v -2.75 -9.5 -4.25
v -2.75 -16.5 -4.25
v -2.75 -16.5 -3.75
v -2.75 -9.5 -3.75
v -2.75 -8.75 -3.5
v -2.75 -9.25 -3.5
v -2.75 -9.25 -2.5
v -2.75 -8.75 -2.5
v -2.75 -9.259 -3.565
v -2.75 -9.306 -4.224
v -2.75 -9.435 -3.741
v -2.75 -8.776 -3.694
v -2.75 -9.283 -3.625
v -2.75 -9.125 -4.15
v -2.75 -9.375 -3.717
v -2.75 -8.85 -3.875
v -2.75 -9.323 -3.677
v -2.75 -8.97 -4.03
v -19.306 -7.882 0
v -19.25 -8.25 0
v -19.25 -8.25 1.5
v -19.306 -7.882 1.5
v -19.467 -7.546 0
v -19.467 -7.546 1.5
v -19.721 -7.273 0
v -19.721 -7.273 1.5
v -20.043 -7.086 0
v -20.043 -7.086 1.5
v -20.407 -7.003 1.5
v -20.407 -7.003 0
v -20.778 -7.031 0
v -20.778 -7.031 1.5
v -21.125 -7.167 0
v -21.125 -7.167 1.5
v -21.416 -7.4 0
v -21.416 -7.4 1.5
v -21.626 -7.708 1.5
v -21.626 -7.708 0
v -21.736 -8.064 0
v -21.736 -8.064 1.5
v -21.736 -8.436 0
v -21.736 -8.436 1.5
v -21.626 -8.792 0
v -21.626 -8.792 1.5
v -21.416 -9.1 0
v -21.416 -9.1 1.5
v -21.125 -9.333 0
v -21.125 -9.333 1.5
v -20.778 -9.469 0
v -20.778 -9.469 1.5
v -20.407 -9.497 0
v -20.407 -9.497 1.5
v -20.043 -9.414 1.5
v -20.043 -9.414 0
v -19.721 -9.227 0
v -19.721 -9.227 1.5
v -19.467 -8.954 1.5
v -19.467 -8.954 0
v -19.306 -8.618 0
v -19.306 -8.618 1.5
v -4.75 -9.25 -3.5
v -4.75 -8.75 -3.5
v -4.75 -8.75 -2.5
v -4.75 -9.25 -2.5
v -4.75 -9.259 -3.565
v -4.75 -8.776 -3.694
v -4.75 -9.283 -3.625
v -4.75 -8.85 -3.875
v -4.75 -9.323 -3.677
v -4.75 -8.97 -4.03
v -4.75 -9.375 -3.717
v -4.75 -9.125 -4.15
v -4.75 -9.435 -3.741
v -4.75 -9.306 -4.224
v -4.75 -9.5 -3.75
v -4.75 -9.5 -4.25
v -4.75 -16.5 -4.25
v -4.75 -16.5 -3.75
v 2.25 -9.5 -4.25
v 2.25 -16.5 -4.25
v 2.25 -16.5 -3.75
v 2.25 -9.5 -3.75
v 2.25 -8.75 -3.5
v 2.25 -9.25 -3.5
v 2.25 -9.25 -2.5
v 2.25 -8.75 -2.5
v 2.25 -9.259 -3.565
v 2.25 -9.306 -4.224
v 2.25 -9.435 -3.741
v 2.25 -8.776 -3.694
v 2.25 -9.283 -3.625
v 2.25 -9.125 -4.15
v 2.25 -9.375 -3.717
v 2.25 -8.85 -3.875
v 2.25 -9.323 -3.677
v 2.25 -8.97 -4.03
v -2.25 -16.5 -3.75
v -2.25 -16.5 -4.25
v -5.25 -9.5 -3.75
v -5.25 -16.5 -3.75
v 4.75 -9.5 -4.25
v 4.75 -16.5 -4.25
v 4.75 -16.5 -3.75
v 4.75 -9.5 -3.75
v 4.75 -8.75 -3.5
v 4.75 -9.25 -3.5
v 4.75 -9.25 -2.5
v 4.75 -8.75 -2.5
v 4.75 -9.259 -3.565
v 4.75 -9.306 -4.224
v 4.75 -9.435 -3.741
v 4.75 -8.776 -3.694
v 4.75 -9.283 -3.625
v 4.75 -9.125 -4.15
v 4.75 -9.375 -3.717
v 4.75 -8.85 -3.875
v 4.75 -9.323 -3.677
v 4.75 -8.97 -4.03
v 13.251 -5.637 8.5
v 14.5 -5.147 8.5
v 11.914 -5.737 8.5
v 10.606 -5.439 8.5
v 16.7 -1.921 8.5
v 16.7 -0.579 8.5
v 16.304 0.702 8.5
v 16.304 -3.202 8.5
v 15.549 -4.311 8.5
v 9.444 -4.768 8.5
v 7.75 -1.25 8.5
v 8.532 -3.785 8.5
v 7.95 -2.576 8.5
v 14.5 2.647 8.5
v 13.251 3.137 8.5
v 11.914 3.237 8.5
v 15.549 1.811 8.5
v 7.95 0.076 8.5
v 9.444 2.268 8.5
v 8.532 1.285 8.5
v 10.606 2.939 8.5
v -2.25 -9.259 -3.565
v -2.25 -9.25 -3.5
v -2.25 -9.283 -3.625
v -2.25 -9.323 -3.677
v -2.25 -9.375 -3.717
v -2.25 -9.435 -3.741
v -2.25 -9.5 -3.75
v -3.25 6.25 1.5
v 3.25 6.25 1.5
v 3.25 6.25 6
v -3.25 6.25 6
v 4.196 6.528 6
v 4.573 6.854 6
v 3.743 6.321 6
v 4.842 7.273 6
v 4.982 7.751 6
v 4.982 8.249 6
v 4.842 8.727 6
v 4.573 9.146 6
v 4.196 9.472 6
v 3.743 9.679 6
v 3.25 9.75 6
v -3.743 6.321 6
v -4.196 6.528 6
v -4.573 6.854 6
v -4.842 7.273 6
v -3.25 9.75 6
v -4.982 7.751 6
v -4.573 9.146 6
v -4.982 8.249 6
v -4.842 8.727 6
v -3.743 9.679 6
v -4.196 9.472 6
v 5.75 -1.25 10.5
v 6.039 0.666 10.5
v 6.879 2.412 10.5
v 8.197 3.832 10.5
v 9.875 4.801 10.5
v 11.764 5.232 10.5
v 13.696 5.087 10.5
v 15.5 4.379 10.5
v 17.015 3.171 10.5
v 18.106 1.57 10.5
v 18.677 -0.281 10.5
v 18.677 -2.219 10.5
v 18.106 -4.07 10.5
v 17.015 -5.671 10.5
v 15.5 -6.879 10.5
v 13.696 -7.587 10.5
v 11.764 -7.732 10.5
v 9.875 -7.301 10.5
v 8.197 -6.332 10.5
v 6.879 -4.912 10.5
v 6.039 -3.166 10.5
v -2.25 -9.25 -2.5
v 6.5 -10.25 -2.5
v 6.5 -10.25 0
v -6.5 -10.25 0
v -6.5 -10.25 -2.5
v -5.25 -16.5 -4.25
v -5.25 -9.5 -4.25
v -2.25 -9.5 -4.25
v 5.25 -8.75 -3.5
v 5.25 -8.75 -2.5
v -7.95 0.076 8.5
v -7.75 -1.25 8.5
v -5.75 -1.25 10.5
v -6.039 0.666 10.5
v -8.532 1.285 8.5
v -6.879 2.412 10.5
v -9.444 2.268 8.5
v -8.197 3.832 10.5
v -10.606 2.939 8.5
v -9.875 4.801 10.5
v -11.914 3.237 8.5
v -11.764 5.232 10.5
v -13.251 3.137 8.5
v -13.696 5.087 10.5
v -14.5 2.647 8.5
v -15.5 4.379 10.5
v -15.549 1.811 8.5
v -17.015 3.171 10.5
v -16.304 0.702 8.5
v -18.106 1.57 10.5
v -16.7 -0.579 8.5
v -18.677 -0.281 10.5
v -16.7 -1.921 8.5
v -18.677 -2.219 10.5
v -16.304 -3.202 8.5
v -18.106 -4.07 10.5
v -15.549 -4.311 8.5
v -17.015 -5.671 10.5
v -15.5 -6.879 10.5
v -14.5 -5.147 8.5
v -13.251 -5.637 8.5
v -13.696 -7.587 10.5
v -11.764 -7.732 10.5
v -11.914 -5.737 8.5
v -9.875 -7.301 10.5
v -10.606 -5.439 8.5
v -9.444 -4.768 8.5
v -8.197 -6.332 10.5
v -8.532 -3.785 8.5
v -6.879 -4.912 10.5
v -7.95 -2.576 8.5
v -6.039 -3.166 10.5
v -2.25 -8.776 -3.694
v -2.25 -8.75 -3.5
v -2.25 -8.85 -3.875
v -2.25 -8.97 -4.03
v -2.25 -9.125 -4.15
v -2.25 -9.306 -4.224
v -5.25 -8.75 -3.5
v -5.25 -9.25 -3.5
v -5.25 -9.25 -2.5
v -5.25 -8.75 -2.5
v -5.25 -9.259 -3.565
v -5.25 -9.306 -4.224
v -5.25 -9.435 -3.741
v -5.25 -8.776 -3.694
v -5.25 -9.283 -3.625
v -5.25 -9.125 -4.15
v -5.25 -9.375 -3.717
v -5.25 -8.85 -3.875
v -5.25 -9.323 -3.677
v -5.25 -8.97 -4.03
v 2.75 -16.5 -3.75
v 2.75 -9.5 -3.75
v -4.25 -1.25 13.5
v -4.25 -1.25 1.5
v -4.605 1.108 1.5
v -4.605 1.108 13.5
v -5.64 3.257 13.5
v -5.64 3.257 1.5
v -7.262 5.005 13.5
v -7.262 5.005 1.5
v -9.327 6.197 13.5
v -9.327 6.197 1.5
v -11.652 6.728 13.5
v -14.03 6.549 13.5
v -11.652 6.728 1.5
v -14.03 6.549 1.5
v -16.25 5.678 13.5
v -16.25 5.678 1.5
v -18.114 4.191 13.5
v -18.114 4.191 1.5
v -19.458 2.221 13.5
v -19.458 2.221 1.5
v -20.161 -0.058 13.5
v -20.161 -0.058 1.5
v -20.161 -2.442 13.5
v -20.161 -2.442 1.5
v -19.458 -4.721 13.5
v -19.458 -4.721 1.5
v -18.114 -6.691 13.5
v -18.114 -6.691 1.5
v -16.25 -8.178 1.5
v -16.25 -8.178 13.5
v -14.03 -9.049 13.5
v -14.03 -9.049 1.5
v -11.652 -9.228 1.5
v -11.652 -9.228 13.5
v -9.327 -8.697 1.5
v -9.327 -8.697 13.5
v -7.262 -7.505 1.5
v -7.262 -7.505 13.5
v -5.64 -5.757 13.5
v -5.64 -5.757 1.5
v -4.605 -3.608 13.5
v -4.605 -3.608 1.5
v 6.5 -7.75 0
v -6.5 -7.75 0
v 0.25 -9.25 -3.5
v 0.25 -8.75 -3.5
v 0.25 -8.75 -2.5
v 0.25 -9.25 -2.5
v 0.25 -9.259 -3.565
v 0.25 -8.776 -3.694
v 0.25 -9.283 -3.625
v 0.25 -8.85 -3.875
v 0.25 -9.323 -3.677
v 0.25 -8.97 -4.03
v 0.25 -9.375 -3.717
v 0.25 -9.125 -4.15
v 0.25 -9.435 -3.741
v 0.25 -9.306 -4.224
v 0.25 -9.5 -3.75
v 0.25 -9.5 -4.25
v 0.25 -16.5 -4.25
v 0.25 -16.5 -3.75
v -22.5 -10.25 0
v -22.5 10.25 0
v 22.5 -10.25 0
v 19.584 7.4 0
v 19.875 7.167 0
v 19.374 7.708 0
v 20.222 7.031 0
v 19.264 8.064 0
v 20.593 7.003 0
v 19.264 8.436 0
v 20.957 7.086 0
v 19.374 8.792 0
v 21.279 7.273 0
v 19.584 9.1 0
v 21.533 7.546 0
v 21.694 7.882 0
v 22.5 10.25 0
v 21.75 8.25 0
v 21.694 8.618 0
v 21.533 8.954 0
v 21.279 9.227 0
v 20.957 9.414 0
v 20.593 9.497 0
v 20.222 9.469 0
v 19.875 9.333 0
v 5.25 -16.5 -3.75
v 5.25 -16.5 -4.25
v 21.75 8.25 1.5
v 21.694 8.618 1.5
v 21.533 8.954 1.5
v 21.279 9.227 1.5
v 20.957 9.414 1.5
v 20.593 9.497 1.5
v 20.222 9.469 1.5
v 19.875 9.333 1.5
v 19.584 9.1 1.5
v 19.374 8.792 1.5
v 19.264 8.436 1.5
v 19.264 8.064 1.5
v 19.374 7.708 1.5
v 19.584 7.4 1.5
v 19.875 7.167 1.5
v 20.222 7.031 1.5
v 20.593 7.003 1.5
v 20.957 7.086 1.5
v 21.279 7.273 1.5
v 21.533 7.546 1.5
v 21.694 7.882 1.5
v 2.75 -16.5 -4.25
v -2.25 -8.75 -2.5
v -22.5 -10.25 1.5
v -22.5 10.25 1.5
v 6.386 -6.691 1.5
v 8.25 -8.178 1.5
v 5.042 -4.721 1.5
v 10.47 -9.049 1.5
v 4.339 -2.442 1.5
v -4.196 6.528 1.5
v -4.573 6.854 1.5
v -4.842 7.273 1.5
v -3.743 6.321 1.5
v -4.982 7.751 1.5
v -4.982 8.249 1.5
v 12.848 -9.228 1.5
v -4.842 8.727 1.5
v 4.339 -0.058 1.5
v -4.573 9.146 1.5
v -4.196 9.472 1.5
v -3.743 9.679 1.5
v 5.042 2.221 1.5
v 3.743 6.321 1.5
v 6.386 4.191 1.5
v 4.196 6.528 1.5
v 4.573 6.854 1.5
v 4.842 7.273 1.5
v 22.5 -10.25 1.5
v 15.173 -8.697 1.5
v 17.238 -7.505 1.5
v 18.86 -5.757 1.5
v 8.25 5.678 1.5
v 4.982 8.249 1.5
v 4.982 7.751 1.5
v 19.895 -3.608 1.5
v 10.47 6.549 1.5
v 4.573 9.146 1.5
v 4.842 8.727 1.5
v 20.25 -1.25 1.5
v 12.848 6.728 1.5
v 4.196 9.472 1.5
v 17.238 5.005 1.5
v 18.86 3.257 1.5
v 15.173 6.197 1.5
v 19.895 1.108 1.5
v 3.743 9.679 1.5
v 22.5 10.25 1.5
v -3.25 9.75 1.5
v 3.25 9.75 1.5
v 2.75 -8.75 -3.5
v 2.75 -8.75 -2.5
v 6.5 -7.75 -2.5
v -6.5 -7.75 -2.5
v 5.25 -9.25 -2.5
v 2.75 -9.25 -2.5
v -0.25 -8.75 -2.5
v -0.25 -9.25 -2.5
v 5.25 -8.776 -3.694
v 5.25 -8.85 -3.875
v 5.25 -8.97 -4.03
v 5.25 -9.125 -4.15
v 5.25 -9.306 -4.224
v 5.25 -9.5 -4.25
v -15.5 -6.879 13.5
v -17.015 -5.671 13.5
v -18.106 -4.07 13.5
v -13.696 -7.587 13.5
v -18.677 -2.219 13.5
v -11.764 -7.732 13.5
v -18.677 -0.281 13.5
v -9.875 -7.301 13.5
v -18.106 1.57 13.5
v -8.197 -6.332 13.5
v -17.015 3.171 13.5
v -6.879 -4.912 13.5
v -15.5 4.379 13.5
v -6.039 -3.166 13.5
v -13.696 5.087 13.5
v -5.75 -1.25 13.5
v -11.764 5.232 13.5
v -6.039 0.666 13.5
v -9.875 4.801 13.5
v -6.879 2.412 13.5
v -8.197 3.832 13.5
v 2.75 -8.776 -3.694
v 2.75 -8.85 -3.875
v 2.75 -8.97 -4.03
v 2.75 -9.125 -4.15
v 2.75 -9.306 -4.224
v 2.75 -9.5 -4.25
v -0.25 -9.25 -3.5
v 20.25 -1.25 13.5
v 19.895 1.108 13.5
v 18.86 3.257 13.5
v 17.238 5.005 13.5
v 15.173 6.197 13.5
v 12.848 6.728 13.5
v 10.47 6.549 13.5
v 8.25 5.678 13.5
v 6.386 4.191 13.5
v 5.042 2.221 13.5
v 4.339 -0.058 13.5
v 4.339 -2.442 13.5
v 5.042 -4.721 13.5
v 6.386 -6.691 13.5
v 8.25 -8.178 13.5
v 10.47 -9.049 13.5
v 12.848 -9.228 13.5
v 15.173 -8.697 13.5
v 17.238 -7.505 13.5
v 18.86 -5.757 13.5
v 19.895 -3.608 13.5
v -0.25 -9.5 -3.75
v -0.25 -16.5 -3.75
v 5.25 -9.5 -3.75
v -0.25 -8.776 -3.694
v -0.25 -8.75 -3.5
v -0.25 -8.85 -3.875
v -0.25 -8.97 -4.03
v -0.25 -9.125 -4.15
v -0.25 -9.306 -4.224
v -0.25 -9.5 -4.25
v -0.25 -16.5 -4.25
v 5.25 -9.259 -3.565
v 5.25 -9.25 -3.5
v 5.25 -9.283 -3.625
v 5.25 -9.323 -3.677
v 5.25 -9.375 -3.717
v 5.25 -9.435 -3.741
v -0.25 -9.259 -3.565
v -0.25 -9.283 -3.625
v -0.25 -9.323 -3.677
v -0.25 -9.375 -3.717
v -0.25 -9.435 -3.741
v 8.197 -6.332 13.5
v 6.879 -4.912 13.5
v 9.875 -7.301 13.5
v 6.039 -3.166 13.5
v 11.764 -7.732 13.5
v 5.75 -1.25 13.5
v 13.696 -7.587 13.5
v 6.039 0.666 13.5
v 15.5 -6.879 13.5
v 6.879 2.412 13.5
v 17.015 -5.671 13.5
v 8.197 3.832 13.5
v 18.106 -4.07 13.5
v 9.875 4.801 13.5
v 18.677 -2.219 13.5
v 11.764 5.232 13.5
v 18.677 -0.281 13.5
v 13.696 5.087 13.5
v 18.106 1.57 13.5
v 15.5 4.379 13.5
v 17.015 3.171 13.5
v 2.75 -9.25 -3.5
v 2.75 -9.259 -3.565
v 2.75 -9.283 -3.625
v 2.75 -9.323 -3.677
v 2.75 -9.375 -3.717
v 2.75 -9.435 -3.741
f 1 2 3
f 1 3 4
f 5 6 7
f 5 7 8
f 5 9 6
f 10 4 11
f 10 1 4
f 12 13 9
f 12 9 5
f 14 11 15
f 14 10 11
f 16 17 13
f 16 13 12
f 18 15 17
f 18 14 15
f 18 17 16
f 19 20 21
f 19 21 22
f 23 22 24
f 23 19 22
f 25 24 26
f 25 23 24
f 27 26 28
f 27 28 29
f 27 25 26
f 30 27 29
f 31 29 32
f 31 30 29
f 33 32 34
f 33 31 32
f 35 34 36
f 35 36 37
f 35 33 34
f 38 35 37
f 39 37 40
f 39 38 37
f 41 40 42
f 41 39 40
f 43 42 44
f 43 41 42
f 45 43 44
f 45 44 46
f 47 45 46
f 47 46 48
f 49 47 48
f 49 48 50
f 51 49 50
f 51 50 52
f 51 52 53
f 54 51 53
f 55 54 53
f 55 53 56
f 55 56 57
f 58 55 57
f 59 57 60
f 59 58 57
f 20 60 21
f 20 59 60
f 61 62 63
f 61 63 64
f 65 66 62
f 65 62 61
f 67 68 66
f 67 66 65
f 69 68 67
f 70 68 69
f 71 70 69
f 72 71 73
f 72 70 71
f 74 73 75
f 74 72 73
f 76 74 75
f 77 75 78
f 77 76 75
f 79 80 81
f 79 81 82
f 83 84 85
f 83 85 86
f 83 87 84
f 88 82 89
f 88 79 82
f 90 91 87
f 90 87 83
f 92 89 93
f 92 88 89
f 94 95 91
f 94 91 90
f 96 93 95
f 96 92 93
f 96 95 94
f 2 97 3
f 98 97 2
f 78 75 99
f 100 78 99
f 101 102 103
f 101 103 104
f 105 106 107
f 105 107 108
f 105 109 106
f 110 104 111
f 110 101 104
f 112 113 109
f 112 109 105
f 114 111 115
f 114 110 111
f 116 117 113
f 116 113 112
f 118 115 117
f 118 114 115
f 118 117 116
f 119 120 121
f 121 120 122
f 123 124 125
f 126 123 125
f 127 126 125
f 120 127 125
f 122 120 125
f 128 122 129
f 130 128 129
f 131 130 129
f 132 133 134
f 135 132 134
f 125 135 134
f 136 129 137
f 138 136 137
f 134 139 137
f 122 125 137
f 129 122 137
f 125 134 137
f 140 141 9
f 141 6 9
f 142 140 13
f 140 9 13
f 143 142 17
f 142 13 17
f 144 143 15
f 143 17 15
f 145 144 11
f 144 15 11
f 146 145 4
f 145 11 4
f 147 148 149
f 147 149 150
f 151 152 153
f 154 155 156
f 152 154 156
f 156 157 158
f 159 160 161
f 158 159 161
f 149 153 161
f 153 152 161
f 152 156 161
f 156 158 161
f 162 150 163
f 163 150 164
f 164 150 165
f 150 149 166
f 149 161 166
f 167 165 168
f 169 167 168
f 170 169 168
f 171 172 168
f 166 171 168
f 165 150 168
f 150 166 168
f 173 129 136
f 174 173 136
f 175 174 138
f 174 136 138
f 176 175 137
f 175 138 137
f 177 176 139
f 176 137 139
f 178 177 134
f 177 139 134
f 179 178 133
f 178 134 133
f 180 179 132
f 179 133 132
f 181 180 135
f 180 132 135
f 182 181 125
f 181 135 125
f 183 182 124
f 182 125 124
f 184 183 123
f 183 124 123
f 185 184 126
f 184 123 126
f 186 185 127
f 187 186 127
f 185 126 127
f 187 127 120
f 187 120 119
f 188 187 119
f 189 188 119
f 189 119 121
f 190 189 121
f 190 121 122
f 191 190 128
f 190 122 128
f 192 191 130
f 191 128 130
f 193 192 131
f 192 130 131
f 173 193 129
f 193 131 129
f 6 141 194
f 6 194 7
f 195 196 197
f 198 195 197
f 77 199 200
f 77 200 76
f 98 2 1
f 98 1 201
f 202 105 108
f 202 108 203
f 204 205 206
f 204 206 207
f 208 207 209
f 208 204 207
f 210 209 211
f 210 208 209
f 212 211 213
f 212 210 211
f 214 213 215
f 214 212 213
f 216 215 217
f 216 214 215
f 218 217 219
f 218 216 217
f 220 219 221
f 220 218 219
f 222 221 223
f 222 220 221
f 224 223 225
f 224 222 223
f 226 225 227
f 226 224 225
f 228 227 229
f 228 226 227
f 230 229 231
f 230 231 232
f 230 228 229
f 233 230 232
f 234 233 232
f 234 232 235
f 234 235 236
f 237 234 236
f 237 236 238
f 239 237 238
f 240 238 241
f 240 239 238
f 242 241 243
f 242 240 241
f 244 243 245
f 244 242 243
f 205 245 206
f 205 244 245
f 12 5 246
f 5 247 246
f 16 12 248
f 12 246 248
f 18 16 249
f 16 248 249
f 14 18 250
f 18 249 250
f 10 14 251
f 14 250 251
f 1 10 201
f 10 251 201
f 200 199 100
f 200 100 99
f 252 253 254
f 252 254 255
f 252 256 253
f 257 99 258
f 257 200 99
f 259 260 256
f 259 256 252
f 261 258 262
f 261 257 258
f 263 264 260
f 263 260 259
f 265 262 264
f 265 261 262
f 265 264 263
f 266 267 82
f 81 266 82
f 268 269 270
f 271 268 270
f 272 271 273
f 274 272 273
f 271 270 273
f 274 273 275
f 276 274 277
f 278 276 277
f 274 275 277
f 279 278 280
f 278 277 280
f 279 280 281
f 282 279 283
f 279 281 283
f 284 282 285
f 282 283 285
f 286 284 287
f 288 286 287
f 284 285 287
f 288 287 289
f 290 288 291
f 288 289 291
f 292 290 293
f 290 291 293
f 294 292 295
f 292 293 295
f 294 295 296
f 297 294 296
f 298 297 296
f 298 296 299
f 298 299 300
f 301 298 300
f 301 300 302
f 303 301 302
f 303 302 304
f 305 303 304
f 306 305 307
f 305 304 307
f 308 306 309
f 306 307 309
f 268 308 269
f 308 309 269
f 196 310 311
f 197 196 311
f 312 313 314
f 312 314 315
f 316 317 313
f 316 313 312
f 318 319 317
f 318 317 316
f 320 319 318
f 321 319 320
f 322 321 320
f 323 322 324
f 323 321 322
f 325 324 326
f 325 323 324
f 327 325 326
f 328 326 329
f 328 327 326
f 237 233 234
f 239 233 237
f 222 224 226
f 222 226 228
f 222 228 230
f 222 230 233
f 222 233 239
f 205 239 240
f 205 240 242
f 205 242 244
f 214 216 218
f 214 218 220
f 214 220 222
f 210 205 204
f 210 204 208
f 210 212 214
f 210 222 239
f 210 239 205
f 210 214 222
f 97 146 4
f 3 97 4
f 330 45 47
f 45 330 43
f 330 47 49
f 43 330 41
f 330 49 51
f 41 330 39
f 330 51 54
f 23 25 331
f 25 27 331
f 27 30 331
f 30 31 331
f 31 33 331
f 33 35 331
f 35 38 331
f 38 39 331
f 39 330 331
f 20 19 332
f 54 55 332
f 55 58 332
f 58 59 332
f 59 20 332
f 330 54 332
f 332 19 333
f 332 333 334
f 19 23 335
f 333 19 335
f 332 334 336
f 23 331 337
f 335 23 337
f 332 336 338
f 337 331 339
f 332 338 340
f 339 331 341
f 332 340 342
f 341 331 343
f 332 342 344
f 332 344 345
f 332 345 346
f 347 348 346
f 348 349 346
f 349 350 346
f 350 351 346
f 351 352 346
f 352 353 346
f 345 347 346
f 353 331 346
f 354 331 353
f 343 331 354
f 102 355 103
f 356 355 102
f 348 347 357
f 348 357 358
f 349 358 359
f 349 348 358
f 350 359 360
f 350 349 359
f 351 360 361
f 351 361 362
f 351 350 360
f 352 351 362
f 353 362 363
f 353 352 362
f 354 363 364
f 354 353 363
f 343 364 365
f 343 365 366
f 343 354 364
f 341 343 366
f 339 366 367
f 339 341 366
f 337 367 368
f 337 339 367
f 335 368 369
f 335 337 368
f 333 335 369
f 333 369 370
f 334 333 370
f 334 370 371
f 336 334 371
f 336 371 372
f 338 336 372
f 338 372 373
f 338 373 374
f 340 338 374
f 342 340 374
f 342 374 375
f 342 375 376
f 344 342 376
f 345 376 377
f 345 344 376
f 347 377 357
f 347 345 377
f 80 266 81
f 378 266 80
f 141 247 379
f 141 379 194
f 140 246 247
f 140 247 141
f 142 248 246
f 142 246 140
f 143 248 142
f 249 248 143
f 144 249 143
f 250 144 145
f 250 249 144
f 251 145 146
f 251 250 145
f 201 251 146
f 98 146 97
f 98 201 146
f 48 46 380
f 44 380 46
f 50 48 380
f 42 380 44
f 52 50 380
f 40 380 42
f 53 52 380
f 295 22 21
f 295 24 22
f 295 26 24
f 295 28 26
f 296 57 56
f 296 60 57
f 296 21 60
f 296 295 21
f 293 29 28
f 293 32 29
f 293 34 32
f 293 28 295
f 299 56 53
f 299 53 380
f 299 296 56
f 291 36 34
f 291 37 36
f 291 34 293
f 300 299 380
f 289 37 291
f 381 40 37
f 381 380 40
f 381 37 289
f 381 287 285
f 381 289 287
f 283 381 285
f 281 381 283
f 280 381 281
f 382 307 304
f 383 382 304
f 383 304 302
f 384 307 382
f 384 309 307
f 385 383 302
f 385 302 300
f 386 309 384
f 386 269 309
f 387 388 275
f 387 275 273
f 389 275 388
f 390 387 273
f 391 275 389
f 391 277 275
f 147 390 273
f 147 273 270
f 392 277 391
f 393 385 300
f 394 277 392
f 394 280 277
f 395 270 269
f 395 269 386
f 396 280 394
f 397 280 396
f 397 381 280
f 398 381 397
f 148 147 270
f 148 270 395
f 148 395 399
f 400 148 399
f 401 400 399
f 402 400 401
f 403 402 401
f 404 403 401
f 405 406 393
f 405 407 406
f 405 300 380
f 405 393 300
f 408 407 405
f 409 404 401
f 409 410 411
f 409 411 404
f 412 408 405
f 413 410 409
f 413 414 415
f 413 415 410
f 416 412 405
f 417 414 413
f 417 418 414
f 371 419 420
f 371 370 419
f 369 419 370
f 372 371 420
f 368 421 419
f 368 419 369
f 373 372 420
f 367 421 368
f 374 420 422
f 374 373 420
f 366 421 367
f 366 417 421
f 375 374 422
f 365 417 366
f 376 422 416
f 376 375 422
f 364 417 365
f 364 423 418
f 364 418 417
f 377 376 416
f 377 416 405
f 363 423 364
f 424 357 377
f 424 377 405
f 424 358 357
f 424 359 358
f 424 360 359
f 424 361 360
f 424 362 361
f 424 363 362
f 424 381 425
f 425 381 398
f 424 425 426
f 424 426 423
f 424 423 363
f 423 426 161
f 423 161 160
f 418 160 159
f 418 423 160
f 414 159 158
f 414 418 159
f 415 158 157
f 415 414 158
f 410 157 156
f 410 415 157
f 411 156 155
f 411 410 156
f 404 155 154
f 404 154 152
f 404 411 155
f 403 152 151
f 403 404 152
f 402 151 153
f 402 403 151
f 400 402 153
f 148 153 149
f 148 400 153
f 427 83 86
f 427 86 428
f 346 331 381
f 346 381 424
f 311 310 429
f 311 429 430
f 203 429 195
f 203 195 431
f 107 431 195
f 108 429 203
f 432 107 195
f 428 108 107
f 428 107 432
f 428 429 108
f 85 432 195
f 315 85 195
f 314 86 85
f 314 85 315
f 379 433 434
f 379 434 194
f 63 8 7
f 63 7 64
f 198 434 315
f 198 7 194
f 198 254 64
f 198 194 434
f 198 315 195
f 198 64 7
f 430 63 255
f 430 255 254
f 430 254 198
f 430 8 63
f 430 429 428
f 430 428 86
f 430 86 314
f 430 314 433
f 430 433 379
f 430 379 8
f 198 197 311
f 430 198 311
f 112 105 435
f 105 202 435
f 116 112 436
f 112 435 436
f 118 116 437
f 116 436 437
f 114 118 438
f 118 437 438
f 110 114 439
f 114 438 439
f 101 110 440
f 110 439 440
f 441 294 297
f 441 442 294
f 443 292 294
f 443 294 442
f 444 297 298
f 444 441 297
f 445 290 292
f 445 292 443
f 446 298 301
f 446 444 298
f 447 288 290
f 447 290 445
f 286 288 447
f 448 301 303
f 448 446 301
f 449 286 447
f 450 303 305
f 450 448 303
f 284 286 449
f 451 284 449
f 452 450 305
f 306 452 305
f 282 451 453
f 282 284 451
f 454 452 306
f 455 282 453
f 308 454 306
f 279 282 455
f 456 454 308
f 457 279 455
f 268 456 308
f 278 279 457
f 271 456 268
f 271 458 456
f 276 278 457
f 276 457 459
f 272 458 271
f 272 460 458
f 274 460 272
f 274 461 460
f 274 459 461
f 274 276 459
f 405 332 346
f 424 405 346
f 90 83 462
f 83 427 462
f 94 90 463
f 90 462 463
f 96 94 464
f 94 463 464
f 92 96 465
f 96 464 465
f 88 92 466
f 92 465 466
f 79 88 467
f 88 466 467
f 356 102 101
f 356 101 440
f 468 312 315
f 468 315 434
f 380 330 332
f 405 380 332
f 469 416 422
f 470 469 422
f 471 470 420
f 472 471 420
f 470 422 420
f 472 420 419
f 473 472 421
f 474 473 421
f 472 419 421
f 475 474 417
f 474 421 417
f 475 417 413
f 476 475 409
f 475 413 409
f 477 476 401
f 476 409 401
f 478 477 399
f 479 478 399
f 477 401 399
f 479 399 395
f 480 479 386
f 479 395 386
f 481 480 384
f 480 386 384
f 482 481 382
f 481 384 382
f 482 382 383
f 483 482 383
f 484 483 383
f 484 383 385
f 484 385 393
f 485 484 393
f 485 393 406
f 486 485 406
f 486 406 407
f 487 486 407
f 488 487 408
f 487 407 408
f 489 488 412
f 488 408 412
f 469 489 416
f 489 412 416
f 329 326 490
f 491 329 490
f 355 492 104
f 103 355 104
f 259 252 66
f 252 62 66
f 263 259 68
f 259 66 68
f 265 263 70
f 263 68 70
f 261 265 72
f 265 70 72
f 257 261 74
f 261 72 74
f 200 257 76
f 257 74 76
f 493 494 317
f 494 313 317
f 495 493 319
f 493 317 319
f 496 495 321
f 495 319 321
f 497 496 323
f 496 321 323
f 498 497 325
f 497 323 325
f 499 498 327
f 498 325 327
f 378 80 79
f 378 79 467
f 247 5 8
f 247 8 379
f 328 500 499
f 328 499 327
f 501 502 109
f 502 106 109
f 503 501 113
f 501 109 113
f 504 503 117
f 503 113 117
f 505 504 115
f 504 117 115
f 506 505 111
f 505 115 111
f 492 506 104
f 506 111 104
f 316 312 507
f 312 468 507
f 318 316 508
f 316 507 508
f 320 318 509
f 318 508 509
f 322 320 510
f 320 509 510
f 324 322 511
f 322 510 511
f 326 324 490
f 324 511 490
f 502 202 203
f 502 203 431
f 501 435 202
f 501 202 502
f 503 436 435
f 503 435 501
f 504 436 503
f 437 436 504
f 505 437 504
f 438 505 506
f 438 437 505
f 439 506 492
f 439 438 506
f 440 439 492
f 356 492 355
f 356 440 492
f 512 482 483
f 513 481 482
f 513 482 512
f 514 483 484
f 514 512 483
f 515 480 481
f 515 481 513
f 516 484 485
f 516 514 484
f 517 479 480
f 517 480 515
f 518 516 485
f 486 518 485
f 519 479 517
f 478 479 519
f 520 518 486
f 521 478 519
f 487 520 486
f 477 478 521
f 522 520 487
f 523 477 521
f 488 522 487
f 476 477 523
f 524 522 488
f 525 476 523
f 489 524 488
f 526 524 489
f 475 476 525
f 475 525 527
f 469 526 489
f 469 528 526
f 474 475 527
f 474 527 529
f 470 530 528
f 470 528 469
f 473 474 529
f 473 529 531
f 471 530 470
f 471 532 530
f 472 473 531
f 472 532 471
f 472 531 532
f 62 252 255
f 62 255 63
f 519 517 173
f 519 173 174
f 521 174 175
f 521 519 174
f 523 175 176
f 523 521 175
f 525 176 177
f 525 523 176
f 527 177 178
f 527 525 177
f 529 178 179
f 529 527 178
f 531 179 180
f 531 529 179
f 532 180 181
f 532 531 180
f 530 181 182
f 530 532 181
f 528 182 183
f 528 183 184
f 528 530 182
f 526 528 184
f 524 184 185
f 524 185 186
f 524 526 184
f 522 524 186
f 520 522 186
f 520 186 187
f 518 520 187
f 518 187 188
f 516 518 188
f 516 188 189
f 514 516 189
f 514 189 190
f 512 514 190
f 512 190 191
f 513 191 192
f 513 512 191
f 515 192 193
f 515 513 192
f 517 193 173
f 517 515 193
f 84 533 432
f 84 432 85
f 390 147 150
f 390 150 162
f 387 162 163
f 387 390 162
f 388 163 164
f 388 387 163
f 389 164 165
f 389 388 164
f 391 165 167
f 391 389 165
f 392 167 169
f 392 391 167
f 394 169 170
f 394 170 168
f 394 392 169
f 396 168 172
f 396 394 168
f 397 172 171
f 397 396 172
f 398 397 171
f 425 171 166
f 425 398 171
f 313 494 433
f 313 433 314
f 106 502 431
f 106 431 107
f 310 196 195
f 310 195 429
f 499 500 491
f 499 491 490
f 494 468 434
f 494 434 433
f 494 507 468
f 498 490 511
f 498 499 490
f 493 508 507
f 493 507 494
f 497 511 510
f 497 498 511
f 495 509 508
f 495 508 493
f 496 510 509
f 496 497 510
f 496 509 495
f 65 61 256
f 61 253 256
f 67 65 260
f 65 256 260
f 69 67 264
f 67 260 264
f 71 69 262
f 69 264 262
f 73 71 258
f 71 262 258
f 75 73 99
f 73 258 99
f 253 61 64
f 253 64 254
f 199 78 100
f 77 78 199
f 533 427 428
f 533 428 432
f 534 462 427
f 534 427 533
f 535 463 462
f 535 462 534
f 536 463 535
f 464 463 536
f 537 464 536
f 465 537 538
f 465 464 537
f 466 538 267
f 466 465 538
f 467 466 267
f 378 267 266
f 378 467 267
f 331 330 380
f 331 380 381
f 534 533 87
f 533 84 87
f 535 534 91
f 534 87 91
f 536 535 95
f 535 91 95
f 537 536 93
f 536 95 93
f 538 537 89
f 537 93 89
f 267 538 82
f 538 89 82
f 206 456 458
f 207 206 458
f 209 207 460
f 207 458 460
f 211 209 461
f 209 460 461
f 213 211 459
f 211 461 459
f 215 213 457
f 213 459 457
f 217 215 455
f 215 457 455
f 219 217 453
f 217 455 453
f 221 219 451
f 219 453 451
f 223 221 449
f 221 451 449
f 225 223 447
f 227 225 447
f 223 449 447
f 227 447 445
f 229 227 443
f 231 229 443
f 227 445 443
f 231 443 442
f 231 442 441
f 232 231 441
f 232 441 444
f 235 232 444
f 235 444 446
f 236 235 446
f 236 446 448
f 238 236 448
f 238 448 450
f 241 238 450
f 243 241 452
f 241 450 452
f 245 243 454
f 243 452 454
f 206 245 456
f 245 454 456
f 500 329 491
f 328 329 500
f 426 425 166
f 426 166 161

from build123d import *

# Parameters (mm, degrees)
SKETCH1_W                = 45
SKETCH1_H                = 20.5
SKETCH1_R                = 1.25
BOSS_EXTRUDE1_DEPTH      = 1.5
SKETCH2_R                = 8
BOSS_EXTRUDE2_DEPTH      = 12
BOSS_EXTRUDE3_DEPTH      = 4.5
SKETCH4_R                = 6.5
CUT_EXTRUDE2_DEPTH       = 5
CHAMFER1_SIZE            = 2
CHAMFER1_OF_MIRROR1_SIZE = 2
SKETCH5_W                = 13
SKETCH5_H                = 2.5
BOSS_EXTRUDE4_DEPTH      = 2.5
SKETCH7_W                = 0.5
SKETCH7_H                = 0.5
LPATTERN1_COUNT          = 3
LPATTERN1_PITCH          = 2.5
LPATTERN1_COL_COUNT      = 3
LPATTERN1_COL_PITCH      = 2.5


with BuildPart() as part:
    # Sketch1 → Boss-Extrude1 (new body)
    with BuildSketch(Plane.XY):
        Rectangle(SKETCH1_W, SKETCH1_H)
        with Locations((20.5, 8.25)):
            Circle(SKETCH1_R, mode=Mode.SUBTRACT)
        with Locations((-20.5, -8.25)):
            Circle(SKETCH1_R, mode=Mode.SUBTRACT)
    extrude(amount=BOSS_EXTRUDE1_DEPTH)

    # Sketch2 → Boss-Extrude2 (add)
    with BuildSketch(Plane.XY.offset(1.5)):
        with Locations((-12.25, -1.25)):
            Circle(SKETCH2_R)
        with Locations((12.25, -1.25)):
            Circle(SKETCH2_R)
    extrude(amount=BOSS_EXTRUDE2_DEPTH)

    # Sketch3 → Boss-Extrude3 (add)
    with BuildSketch(Plane.XY.offset(1.5)):
        with BuildLine():
            Line((-3.25, 9.75), (3.25, 9.75))
            ThreePointArc((3.25, 9.75), (5, 8), (3.25, 6.25))
            Line((3.25, 6.25), (-3.25, 6.25))
            ThreePointArc((-3.25, 6.25), (-5, 8), (-3.25, 9.75))
        make_face()
    extrude(amount=BOSS_EXTRUDE3_DEPTH)

    # Sketch4 → Cut-Extrude2 (cut)
    with BuildSketch(Plane.XY.offset(13.5)):
        with Locations((-12.25, -1.25)):
            Circle(SKETCH4_R)
    cut_extrude2 = extrude(amount=-CUT_EXTRUDE2_DEPTH, mode=Mode.SUBTRACT)

    # Chamfer1
    chamfer1_edges = [part.edges().sort_by_distance(p)[0] for p in [
        (-18.75, -1.25, 8.5),
    ]]
    chamfer(chamfer1_edges, length=CHAMFER1_SIZE)

    # Mirror1: Cut-Extrude2 across plane
    add(cut_extrude2.mirror(Plane(origin=(0, 0, 0), x_dir=(0, 0, 1), z_dir=(1, 0, 0))), mode=Mode.SUBTRACT)

    # Chamfer1 of Mirror1
    chamfer1_of_mirror1_edges = [part.edges().sort_by_distance(p)[0] for p in [
        (18.75, -1.25, 8.5),
    ]]
    chamfer(chamfer1_of_mirror1_edges, length=CHAMFER1_OF_MIRROR1_SIZE)


with BuildPart() as body_2:
    # Sketch5 → Boss-Extrude4 (new body)
    with BuildSketch(Plane(origin=(0, 0, 0), x_dir=(-1, 0, 0), z_dir=(0, 0, -1))):
        with Locations((0, -9)):
            Rectangle(SKETCH5_W, SKETCH5_H)
    extrude(amount=BOSS_EXTRUDE4_DEPTH)

    # Sweep1: sweep along a path in Sketch6
    with BuildLine(Plane(origin=(0, 0, 0), x_dir=(0, 0, -1), z_dir=(1, 0, 0))) as sweep1_path:
        Line((2.5, -9), (3.5, -9))
        ThreePointArc((3.5, -9), (3.853553391, -9.146446609), (4, -9.5))
        Line((4, -9.5), (4, -16.5))
    # Sketch7 → Sweep1 (sweep)
    with BuildSketch(Plane(origin=(0, 0, -2.5), x_dir=(-1, 0, 0), z_dir=(0, 0, -1))):
        with Locations((0, -9)):
            Rectangle(SKETCH7_W, SKETCH7_H)
    sweep1 = sweep(path=sweep1_path.line)

    # LPattern1: Sweep1 ×3
    with Locations(*[(-i * LPATTERN1_PITCH, 0, 0) for i in range(1, LPATTERN1_COUNT)]):
        add(sweep1)

    # LPattern1 col: Sweep1 ×3
    with Locations(*[(i * LPATTERN1_COL_PITCH, 0, 0) for i in range(1, LPATTERN1_COL_COUNT)]):
        add(sweep1)


solid = Compound([part.part, body_2.part])
